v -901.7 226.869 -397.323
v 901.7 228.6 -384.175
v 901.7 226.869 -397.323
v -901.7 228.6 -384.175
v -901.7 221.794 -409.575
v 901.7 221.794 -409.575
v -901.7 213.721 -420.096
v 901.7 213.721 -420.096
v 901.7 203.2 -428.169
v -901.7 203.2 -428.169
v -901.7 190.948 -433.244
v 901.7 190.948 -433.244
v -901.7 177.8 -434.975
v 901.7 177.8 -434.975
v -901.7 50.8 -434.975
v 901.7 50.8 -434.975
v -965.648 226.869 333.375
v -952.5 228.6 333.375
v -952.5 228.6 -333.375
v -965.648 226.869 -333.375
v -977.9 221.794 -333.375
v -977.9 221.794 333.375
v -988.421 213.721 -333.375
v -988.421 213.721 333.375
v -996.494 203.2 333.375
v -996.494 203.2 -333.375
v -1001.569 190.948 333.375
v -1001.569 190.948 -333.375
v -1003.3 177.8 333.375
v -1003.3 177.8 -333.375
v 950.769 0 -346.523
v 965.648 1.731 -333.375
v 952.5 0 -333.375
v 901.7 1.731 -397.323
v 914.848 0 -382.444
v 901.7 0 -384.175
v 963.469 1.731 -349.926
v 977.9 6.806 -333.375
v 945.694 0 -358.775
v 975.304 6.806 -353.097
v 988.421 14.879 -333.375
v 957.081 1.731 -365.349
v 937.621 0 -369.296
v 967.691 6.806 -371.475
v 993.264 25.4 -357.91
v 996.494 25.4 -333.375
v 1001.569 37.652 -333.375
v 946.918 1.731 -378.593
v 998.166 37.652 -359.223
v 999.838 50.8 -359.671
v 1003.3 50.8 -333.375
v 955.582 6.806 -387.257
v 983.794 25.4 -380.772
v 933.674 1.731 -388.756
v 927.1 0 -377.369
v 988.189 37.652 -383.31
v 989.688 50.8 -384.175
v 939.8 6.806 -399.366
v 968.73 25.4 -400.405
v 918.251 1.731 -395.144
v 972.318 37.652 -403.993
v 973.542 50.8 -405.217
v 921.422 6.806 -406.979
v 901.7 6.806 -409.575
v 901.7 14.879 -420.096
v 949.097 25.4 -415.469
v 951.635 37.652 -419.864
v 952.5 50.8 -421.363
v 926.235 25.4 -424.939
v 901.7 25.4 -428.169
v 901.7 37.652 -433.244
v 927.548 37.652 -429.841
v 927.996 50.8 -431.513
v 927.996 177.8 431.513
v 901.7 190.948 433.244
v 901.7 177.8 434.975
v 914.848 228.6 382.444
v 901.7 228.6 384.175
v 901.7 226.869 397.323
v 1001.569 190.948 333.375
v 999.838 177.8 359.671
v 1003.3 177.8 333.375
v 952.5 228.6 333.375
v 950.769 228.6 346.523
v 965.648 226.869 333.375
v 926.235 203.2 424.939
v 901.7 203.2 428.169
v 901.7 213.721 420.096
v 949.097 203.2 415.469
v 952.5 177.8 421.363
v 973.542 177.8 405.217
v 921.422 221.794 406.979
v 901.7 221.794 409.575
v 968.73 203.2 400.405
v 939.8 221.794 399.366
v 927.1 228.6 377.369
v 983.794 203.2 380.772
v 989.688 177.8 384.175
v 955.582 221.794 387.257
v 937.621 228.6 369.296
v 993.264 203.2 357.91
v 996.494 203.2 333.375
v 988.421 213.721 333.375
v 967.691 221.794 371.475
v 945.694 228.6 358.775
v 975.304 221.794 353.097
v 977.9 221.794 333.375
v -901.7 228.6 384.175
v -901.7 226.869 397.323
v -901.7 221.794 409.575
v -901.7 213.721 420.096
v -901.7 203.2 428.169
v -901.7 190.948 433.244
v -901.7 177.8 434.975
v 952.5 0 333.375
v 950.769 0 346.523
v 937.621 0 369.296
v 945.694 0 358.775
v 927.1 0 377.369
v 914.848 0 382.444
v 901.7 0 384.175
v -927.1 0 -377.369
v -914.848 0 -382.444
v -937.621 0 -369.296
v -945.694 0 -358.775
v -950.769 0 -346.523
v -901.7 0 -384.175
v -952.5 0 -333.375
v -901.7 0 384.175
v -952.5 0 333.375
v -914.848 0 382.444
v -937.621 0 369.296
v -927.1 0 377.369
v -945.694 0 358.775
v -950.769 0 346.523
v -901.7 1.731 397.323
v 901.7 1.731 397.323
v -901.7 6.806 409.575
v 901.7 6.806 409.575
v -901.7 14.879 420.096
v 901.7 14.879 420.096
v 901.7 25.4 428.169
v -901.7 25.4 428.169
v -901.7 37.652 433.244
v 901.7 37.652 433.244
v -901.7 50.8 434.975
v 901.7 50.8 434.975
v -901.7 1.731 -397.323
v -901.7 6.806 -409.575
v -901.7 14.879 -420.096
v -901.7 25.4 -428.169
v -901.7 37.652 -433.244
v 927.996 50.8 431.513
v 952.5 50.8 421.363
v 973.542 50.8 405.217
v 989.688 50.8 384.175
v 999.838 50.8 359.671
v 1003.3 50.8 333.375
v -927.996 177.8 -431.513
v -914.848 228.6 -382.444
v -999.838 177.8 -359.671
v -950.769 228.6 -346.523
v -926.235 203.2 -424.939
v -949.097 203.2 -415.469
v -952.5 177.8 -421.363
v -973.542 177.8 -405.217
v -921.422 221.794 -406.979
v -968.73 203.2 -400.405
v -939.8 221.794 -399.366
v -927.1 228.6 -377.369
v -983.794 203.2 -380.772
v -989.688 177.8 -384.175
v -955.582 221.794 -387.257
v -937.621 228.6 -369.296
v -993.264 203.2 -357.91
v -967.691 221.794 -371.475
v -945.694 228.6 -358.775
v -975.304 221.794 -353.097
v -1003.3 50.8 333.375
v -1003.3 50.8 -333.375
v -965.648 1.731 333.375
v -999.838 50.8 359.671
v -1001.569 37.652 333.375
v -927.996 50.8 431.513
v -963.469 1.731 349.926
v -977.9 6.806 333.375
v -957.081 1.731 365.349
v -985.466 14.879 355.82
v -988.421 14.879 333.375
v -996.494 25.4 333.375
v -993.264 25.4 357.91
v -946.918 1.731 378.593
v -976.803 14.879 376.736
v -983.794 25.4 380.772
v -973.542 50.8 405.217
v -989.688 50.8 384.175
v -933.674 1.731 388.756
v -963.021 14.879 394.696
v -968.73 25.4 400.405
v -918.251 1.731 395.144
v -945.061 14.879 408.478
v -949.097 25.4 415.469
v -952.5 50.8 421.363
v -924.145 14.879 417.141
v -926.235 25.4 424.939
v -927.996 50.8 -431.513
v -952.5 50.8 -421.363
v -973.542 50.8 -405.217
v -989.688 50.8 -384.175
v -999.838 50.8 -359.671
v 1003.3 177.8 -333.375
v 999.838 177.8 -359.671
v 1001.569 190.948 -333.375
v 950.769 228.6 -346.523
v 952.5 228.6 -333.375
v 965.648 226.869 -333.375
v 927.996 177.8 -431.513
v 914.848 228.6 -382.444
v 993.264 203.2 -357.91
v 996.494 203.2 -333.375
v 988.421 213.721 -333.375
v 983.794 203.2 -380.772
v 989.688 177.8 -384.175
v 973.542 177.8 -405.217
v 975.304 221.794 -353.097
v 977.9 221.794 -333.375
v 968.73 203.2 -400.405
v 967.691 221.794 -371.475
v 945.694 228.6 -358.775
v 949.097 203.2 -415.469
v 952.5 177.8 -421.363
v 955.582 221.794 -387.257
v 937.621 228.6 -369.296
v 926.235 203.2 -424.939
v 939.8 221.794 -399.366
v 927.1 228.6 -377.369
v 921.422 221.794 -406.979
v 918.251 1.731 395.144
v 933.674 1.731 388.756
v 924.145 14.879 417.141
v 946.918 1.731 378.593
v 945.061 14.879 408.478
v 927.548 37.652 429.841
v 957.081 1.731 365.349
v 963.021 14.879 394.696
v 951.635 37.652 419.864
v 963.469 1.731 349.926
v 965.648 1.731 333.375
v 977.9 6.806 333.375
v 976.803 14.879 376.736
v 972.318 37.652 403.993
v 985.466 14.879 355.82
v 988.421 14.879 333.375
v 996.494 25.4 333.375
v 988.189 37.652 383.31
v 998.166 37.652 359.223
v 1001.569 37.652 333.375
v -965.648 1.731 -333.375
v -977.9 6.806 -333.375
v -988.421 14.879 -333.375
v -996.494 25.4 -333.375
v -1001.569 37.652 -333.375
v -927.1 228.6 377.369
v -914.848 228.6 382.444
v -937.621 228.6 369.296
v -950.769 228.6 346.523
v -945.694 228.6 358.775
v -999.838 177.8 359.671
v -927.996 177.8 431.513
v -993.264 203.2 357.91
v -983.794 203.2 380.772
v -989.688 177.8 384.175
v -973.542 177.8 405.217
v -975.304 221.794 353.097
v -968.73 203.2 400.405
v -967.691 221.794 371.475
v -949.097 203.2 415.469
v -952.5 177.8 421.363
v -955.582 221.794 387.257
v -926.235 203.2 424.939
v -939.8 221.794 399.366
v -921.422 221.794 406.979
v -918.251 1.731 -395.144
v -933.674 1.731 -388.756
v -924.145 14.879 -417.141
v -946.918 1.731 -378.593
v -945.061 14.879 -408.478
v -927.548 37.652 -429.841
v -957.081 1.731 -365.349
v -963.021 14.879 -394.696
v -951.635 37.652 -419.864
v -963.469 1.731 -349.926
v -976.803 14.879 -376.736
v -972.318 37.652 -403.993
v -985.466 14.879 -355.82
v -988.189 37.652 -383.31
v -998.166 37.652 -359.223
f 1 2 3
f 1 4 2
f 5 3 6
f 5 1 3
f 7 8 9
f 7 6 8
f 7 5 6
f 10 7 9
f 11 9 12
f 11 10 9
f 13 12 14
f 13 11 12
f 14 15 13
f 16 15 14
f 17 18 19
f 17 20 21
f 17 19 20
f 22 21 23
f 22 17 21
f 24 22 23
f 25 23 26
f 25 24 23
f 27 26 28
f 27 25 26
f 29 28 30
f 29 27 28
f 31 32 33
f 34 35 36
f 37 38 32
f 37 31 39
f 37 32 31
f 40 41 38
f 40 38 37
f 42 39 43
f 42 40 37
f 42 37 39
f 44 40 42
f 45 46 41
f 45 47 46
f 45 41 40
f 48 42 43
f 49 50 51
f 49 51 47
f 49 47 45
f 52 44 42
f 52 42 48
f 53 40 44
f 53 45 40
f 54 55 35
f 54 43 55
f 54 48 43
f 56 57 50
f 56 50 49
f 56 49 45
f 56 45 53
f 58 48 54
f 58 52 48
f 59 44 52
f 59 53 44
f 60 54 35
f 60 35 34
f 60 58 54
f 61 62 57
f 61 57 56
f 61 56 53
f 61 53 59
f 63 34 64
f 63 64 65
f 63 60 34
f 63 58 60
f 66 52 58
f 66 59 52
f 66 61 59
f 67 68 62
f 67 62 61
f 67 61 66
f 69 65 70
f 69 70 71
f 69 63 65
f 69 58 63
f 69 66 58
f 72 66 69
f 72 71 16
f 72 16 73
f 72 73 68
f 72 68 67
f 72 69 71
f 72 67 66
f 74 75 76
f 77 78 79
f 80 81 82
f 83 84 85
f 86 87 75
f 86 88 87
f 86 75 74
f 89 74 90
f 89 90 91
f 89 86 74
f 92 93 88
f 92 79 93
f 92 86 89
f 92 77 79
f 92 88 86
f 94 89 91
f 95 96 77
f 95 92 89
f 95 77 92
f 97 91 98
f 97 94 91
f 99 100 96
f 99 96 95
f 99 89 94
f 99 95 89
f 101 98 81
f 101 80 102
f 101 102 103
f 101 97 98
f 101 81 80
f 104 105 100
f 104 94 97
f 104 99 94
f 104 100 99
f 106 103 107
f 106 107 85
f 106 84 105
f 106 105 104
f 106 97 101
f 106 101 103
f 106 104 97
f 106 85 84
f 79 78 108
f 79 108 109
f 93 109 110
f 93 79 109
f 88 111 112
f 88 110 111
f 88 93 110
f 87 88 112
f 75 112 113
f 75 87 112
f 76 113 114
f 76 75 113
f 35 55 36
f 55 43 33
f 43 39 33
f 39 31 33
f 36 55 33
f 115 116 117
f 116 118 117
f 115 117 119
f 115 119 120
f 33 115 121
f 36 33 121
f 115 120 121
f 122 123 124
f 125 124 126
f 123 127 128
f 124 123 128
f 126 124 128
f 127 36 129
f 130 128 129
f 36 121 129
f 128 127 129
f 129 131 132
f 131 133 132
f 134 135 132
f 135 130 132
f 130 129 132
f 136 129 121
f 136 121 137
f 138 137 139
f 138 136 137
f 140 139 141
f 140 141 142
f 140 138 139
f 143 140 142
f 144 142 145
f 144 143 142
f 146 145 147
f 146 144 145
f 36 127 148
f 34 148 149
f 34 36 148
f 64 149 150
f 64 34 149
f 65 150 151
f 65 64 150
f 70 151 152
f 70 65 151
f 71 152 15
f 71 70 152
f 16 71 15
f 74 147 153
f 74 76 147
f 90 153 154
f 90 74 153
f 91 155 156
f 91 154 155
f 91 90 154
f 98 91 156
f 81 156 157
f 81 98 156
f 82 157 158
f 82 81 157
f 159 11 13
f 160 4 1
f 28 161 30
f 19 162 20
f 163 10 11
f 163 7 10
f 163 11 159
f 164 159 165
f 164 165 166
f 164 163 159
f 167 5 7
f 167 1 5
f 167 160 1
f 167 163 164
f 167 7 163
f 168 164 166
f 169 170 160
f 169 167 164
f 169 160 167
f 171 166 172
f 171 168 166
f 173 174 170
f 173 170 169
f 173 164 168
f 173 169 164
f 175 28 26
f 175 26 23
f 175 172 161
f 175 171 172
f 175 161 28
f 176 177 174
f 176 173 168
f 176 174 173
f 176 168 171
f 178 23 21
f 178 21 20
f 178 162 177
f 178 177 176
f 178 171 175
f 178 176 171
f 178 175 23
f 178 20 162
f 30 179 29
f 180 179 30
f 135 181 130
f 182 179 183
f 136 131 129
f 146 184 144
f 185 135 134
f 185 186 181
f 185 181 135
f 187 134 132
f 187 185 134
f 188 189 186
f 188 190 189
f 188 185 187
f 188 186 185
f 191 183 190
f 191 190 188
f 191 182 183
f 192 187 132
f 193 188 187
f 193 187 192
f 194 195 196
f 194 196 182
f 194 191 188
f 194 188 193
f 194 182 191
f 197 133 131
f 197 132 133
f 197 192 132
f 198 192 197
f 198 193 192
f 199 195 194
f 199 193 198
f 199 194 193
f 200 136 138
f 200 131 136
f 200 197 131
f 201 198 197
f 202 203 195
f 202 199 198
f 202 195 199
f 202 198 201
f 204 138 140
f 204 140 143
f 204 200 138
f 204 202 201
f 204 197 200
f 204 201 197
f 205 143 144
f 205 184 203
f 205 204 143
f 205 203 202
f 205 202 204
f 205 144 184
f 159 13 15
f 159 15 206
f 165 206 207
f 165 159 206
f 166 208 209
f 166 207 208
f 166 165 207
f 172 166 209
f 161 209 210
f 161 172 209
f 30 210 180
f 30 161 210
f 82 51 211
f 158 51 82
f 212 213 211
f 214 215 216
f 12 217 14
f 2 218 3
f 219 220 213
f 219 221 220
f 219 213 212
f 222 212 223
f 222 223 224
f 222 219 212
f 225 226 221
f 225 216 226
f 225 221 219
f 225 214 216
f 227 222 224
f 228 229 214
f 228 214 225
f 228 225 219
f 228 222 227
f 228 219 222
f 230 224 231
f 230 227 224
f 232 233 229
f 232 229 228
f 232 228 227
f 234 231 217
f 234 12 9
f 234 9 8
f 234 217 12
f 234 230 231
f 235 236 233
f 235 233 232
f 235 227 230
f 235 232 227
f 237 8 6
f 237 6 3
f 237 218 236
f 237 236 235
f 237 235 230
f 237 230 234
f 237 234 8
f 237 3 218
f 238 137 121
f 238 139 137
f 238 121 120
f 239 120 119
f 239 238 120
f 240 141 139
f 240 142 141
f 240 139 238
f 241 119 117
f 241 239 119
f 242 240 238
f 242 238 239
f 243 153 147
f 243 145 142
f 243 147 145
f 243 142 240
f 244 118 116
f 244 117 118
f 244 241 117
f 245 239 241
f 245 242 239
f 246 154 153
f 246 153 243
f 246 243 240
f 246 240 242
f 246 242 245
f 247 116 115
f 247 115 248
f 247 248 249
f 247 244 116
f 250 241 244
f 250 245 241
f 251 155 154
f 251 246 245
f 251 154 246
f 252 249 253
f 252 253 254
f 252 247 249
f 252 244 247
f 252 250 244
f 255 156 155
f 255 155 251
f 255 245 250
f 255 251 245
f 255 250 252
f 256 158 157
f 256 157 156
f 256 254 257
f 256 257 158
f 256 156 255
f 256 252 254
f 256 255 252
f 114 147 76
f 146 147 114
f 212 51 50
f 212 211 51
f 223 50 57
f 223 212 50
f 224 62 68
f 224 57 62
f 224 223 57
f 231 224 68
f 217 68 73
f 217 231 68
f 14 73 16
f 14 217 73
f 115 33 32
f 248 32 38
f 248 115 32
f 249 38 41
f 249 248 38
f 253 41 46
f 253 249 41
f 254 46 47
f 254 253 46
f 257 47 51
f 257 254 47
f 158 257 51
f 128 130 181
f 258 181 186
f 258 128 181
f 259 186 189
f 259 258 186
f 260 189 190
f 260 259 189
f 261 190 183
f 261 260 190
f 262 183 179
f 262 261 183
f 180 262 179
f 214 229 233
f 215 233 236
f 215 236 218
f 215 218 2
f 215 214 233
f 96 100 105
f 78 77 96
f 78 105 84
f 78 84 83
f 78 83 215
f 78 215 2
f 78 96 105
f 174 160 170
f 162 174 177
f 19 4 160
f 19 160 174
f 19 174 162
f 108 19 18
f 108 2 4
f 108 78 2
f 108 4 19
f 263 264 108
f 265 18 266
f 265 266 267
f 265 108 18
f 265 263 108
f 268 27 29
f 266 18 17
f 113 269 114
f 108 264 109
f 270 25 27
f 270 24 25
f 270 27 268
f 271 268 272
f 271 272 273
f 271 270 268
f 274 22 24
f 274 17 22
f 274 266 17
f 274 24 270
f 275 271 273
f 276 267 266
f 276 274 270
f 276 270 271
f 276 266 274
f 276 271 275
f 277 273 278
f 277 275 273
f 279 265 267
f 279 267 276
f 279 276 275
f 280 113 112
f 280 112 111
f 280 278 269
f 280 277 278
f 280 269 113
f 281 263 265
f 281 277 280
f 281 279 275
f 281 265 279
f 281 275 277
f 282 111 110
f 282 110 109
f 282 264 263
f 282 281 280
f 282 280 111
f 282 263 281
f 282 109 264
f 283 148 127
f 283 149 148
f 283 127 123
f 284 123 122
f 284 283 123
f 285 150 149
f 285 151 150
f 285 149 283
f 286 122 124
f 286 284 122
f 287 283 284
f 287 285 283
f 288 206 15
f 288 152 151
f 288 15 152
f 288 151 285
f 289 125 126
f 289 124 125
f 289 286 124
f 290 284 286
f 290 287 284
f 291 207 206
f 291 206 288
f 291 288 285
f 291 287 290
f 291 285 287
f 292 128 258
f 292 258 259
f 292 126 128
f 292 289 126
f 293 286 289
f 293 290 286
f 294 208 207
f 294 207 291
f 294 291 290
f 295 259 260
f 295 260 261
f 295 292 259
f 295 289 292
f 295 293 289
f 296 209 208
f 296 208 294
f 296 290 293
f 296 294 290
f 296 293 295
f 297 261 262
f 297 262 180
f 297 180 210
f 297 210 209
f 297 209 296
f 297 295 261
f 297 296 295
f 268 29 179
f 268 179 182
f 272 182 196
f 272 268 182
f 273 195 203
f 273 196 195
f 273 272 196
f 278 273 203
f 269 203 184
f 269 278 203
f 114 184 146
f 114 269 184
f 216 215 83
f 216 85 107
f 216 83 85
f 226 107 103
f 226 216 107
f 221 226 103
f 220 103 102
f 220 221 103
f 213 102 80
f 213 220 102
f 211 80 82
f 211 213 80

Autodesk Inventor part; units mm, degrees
ref_plane "YZ Plane" through (0, 0, 0) normal (1, 0, 0) x (0, 1, 0)
ref_plane "XZ Plane" through (0, 0, 0) normal (0, 1, 0) x (-1, 0, 0)
ref_plane "XY Plane" through (0, 0, 0) normal (0, 0, 1) x (1, 0, 0)
sketch "Sketch1" plane through (0, 0, 0) normal (0, 1, 0) x (-1, 0, 0)
  line L0 (-1003.3, 434.975) -> (1003.3, 434.975)
  line L1 (1003.3, 434.975) -> (1003.3, -434.975)
  line L2 (1003.3, -434.975) -> (-1003.3, -434.975)
  line L3 (-1003.3, -434.975) -> (-1003.3, 434.975)
  line L4 (-1003.3, 434.975) -> (1003.3, -434.975) construction
  line L5 (1003.3, 434.975) -> (-1003.3, -434.975) construction
  point P0 (0, 0)
  dimension "d0" = 869.95
  dimension "d3" = 2006.6
extrude "Extrusion1" add sketch "Sketch1" along normal blind 228.6
fillet "Fillet1" radius 101.6 4 edges at (1003.3, 114.3, 434.975) (1003.3, 114.3, -434.975) (-1003.3, 114.3, 434.975) (-1003.3, 114.3, -434.975)
fillet "Fillet2" radius 50.8 16 edges at (973.542, 228.6, 405.217) (1003.3, 228.6, 0) (973.542, 228.6, -405.217) (0, 228.6, -434.975) (-973.542, 228.6, -405.217) (-1003.3, 228.6, 0) (-973.542, 228.6, 405.217) (0, 228.6, 434.975) (-973.542, 0, 405.217) (-1003.3, 0, 0) (-973.542, 0, -405.217) (0, 0, -434.975) (973.542, 0, -405.217) (1003.3, 0, 0) (973.542, 0, 405.217) (0, 0, 434.975)
properties part number "Mattress"
